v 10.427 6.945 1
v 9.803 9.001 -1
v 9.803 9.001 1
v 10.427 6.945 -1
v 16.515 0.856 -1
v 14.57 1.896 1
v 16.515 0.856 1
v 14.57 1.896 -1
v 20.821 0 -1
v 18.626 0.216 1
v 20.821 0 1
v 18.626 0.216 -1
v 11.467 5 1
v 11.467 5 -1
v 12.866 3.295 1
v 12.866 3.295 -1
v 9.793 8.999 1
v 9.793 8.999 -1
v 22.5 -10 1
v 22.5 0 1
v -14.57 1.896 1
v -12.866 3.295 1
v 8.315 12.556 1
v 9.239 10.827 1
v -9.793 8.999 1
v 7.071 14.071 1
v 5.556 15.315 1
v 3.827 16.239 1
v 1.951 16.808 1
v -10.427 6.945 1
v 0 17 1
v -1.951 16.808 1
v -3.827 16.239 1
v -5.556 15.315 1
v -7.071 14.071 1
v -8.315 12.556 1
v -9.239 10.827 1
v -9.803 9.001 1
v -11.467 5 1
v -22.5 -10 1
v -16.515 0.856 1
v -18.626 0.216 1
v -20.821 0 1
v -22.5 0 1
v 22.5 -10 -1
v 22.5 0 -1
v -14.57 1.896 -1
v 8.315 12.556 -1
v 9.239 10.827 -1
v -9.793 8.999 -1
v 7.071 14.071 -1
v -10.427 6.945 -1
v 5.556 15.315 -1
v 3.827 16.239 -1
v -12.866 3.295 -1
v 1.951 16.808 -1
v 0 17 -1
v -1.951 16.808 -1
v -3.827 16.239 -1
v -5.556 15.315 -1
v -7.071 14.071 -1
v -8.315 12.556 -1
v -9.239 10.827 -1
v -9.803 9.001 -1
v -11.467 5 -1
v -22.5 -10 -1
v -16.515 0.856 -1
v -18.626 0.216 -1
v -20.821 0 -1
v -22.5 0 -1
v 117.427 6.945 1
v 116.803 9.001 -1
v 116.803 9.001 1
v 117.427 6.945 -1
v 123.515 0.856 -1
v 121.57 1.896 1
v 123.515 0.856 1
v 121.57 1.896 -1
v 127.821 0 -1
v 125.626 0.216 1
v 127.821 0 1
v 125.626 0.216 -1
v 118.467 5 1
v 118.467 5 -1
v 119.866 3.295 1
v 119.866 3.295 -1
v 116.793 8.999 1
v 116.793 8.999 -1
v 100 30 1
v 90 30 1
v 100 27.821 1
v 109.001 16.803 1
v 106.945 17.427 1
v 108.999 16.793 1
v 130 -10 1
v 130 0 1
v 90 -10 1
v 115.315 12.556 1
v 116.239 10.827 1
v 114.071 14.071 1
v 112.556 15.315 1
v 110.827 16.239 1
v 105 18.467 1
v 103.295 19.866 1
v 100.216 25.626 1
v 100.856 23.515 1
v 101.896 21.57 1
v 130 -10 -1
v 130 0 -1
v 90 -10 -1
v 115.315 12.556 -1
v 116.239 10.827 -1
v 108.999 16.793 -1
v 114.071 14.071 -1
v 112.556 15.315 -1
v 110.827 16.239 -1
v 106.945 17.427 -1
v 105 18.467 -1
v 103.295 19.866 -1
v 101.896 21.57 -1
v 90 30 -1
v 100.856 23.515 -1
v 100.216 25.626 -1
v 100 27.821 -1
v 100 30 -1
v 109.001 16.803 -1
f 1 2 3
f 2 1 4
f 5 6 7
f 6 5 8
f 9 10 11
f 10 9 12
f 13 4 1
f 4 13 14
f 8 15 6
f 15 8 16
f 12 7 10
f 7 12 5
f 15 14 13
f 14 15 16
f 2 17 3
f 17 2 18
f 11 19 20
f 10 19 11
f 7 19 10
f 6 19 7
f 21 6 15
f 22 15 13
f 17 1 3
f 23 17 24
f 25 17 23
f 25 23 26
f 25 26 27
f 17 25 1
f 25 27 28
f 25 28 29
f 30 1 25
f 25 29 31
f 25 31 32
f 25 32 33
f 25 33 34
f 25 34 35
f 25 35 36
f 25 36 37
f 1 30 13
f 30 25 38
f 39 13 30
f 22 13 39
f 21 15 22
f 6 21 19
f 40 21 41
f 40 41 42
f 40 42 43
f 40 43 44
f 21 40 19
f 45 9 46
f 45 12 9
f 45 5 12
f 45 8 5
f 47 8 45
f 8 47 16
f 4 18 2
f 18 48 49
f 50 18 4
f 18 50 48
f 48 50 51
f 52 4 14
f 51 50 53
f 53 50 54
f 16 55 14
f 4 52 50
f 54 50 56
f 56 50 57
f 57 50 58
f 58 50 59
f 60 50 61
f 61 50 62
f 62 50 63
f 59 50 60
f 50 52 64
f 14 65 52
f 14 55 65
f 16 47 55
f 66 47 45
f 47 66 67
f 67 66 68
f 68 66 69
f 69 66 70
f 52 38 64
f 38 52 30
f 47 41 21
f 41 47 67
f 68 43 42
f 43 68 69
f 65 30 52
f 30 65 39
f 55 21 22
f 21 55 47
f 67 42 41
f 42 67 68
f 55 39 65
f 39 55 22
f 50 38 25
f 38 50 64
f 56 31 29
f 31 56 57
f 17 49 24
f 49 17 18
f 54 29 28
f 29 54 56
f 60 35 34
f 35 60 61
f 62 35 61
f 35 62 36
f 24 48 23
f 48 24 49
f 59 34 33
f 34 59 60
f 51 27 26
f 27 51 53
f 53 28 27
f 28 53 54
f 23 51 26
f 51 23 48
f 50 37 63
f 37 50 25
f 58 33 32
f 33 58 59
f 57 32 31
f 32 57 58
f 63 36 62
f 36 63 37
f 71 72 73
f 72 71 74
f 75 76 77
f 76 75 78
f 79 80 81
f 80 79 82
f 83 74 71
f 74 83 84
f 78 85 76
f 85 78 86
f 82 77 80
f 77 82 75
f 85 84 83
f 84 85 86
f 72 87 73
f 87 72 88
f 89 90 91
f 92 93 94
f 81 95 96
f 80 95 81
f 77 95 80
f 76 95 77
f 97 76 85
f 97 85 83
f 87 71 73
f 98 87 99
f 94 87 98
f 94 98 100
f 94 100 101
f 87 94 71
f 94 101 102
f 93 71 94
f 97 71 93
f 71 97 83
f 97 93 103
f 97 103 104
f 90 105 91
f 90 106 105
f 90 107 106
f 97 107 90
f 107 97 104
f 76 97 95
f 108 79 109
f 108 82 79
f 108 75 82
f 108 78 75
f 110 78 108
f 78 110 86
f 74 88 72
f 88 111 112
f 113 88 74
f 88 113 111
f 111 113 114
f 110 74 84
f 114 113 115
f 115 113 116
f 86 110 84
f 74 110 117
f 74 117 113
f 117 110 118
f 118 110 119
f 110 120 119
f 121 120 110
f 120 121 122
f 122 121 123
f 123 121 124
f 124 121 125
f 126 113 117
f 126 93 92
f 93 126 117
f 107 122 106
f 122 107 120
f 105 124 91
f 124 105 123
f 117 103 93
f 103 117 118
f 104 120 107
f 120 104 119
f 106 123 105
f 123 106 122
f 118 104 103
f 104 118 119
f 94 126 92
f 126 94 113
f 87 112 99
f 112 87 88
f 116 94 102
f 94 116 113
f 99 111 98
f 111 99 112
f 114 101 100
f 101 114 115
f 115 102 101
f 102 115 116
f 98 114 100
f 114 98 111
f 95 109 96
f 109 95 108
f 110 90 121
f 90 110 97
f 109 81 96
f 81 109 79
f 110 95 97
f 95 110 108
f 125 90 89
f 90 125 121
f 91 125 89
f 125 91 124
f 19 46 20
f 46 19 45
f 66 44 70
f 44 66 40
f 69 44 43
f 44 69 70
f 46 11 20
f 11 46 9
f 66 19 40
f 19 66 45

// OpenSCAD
/**
Copyright 2023 - Harry Joseph Braviner
For permission to use please contact me by e-mail.

Creates filleted cylinders for smooth blending into flat surfaces.
*/

EPS=0.001;
$fn=32;

module filleted_cylinder(
    r,
    h,
    x1,
    x2,
    angle=180,
) {
    // Create the fillet
    module fillet() {
        theta = acos((x2 - r)/r);  // Angle from y-axis of point where fillet is tangent to cylinder
        r2 = ((1 + cos(theta))*r - x1) / (1 - cos(theta));  // Radius of the cylinder the fillet will be made from
        translate([(r+r2)*sin(theta), r + (r+r2)*cos(theta), 0.5*h])
        difference() {
            cylinder(r=r2+2*r+EPS, h=h, center=true);
            union() {
                cylinder(r=r2, h=h+2*EPS, center=true);
                
                translate([0.0, -0.5*(r2 + 2*r) -0.5*EPS - r2 - EPS, 0.0])
                cube([2*(2*r+r2)+2*EPS, r2 + 2*r + 2*EPS, h+2*EPS], center=true);
                
                translate([0.5*(r2 + 2*r + EPS), 0.0, 0.0])
                cube([r2 + 2*r + EPS, 2*(2*r+r2) + 2*EPS, h+2*EPS], center=true);
                
                translate([-0.5*(r2 + 2*r + EPS) - (r+r2)*sin(theta), 0.0, 0.0])
                cube([r2 + 2*r + EPS, 2*(2*r+r2) + 2*EPS, h+2*EPS], center=true);
                
                rotate([0.0, 0.0, -90 - theta])
                translate([0.0, -0.5*(r2 + 2*r + 2*EPS), 0.0])
                cube([2*(2*r+r2)+2*EPS, r2 + 2*r + 2*EPS, h+2*EPS], center=true);
            }
        }
    }
    
    cylinder(r=r, h=h, center=true);

    translate([0.0, -r, -0.5*h])
    fillet();

    rotate([0.0, 0.0, -180 + angle])
    translate([0.0, -r, -0.5*h])
    mirror([1.0, 0.0, 0.0])
    fillet();
}

// Demo

// Cylinder on a flat part
translate([0.0, -0.5*10.0, 0.0])
cube([45.0, 10.0, 2.0], center=true);
translate([0.0, 10.0 - 3.0, 0.0])
filleted_cylinder(r=10.0, h=2.0, x1 = 3.0, x2=12.0, angle=180);

//Cylinder in a 90 degree corner
translate([100.0, 0.0, 0.0]) {
    translate([0.25*60.0 - 0.5*10.0, -0.5*10.0, 0.0])
    cube([0.5*60.0 + 10.0, 10.0, 2.0], center=true);
    
    rotate([0.0, 0.0, -90.0])
    translate([-0.25*60.0 + 0.5*10.0, -0.5*10.0, 0.0])
    cube([0.5*60.0 + 10.0, 10.0, 2.0], center=true);
    
    translate([10.0 - 3.0, 10.0 - 3.0, 0.0])
    filleted_cylinder(r=10.0, h=2.0, x1 = 3.0, x2=12.0, angle=90);
}
